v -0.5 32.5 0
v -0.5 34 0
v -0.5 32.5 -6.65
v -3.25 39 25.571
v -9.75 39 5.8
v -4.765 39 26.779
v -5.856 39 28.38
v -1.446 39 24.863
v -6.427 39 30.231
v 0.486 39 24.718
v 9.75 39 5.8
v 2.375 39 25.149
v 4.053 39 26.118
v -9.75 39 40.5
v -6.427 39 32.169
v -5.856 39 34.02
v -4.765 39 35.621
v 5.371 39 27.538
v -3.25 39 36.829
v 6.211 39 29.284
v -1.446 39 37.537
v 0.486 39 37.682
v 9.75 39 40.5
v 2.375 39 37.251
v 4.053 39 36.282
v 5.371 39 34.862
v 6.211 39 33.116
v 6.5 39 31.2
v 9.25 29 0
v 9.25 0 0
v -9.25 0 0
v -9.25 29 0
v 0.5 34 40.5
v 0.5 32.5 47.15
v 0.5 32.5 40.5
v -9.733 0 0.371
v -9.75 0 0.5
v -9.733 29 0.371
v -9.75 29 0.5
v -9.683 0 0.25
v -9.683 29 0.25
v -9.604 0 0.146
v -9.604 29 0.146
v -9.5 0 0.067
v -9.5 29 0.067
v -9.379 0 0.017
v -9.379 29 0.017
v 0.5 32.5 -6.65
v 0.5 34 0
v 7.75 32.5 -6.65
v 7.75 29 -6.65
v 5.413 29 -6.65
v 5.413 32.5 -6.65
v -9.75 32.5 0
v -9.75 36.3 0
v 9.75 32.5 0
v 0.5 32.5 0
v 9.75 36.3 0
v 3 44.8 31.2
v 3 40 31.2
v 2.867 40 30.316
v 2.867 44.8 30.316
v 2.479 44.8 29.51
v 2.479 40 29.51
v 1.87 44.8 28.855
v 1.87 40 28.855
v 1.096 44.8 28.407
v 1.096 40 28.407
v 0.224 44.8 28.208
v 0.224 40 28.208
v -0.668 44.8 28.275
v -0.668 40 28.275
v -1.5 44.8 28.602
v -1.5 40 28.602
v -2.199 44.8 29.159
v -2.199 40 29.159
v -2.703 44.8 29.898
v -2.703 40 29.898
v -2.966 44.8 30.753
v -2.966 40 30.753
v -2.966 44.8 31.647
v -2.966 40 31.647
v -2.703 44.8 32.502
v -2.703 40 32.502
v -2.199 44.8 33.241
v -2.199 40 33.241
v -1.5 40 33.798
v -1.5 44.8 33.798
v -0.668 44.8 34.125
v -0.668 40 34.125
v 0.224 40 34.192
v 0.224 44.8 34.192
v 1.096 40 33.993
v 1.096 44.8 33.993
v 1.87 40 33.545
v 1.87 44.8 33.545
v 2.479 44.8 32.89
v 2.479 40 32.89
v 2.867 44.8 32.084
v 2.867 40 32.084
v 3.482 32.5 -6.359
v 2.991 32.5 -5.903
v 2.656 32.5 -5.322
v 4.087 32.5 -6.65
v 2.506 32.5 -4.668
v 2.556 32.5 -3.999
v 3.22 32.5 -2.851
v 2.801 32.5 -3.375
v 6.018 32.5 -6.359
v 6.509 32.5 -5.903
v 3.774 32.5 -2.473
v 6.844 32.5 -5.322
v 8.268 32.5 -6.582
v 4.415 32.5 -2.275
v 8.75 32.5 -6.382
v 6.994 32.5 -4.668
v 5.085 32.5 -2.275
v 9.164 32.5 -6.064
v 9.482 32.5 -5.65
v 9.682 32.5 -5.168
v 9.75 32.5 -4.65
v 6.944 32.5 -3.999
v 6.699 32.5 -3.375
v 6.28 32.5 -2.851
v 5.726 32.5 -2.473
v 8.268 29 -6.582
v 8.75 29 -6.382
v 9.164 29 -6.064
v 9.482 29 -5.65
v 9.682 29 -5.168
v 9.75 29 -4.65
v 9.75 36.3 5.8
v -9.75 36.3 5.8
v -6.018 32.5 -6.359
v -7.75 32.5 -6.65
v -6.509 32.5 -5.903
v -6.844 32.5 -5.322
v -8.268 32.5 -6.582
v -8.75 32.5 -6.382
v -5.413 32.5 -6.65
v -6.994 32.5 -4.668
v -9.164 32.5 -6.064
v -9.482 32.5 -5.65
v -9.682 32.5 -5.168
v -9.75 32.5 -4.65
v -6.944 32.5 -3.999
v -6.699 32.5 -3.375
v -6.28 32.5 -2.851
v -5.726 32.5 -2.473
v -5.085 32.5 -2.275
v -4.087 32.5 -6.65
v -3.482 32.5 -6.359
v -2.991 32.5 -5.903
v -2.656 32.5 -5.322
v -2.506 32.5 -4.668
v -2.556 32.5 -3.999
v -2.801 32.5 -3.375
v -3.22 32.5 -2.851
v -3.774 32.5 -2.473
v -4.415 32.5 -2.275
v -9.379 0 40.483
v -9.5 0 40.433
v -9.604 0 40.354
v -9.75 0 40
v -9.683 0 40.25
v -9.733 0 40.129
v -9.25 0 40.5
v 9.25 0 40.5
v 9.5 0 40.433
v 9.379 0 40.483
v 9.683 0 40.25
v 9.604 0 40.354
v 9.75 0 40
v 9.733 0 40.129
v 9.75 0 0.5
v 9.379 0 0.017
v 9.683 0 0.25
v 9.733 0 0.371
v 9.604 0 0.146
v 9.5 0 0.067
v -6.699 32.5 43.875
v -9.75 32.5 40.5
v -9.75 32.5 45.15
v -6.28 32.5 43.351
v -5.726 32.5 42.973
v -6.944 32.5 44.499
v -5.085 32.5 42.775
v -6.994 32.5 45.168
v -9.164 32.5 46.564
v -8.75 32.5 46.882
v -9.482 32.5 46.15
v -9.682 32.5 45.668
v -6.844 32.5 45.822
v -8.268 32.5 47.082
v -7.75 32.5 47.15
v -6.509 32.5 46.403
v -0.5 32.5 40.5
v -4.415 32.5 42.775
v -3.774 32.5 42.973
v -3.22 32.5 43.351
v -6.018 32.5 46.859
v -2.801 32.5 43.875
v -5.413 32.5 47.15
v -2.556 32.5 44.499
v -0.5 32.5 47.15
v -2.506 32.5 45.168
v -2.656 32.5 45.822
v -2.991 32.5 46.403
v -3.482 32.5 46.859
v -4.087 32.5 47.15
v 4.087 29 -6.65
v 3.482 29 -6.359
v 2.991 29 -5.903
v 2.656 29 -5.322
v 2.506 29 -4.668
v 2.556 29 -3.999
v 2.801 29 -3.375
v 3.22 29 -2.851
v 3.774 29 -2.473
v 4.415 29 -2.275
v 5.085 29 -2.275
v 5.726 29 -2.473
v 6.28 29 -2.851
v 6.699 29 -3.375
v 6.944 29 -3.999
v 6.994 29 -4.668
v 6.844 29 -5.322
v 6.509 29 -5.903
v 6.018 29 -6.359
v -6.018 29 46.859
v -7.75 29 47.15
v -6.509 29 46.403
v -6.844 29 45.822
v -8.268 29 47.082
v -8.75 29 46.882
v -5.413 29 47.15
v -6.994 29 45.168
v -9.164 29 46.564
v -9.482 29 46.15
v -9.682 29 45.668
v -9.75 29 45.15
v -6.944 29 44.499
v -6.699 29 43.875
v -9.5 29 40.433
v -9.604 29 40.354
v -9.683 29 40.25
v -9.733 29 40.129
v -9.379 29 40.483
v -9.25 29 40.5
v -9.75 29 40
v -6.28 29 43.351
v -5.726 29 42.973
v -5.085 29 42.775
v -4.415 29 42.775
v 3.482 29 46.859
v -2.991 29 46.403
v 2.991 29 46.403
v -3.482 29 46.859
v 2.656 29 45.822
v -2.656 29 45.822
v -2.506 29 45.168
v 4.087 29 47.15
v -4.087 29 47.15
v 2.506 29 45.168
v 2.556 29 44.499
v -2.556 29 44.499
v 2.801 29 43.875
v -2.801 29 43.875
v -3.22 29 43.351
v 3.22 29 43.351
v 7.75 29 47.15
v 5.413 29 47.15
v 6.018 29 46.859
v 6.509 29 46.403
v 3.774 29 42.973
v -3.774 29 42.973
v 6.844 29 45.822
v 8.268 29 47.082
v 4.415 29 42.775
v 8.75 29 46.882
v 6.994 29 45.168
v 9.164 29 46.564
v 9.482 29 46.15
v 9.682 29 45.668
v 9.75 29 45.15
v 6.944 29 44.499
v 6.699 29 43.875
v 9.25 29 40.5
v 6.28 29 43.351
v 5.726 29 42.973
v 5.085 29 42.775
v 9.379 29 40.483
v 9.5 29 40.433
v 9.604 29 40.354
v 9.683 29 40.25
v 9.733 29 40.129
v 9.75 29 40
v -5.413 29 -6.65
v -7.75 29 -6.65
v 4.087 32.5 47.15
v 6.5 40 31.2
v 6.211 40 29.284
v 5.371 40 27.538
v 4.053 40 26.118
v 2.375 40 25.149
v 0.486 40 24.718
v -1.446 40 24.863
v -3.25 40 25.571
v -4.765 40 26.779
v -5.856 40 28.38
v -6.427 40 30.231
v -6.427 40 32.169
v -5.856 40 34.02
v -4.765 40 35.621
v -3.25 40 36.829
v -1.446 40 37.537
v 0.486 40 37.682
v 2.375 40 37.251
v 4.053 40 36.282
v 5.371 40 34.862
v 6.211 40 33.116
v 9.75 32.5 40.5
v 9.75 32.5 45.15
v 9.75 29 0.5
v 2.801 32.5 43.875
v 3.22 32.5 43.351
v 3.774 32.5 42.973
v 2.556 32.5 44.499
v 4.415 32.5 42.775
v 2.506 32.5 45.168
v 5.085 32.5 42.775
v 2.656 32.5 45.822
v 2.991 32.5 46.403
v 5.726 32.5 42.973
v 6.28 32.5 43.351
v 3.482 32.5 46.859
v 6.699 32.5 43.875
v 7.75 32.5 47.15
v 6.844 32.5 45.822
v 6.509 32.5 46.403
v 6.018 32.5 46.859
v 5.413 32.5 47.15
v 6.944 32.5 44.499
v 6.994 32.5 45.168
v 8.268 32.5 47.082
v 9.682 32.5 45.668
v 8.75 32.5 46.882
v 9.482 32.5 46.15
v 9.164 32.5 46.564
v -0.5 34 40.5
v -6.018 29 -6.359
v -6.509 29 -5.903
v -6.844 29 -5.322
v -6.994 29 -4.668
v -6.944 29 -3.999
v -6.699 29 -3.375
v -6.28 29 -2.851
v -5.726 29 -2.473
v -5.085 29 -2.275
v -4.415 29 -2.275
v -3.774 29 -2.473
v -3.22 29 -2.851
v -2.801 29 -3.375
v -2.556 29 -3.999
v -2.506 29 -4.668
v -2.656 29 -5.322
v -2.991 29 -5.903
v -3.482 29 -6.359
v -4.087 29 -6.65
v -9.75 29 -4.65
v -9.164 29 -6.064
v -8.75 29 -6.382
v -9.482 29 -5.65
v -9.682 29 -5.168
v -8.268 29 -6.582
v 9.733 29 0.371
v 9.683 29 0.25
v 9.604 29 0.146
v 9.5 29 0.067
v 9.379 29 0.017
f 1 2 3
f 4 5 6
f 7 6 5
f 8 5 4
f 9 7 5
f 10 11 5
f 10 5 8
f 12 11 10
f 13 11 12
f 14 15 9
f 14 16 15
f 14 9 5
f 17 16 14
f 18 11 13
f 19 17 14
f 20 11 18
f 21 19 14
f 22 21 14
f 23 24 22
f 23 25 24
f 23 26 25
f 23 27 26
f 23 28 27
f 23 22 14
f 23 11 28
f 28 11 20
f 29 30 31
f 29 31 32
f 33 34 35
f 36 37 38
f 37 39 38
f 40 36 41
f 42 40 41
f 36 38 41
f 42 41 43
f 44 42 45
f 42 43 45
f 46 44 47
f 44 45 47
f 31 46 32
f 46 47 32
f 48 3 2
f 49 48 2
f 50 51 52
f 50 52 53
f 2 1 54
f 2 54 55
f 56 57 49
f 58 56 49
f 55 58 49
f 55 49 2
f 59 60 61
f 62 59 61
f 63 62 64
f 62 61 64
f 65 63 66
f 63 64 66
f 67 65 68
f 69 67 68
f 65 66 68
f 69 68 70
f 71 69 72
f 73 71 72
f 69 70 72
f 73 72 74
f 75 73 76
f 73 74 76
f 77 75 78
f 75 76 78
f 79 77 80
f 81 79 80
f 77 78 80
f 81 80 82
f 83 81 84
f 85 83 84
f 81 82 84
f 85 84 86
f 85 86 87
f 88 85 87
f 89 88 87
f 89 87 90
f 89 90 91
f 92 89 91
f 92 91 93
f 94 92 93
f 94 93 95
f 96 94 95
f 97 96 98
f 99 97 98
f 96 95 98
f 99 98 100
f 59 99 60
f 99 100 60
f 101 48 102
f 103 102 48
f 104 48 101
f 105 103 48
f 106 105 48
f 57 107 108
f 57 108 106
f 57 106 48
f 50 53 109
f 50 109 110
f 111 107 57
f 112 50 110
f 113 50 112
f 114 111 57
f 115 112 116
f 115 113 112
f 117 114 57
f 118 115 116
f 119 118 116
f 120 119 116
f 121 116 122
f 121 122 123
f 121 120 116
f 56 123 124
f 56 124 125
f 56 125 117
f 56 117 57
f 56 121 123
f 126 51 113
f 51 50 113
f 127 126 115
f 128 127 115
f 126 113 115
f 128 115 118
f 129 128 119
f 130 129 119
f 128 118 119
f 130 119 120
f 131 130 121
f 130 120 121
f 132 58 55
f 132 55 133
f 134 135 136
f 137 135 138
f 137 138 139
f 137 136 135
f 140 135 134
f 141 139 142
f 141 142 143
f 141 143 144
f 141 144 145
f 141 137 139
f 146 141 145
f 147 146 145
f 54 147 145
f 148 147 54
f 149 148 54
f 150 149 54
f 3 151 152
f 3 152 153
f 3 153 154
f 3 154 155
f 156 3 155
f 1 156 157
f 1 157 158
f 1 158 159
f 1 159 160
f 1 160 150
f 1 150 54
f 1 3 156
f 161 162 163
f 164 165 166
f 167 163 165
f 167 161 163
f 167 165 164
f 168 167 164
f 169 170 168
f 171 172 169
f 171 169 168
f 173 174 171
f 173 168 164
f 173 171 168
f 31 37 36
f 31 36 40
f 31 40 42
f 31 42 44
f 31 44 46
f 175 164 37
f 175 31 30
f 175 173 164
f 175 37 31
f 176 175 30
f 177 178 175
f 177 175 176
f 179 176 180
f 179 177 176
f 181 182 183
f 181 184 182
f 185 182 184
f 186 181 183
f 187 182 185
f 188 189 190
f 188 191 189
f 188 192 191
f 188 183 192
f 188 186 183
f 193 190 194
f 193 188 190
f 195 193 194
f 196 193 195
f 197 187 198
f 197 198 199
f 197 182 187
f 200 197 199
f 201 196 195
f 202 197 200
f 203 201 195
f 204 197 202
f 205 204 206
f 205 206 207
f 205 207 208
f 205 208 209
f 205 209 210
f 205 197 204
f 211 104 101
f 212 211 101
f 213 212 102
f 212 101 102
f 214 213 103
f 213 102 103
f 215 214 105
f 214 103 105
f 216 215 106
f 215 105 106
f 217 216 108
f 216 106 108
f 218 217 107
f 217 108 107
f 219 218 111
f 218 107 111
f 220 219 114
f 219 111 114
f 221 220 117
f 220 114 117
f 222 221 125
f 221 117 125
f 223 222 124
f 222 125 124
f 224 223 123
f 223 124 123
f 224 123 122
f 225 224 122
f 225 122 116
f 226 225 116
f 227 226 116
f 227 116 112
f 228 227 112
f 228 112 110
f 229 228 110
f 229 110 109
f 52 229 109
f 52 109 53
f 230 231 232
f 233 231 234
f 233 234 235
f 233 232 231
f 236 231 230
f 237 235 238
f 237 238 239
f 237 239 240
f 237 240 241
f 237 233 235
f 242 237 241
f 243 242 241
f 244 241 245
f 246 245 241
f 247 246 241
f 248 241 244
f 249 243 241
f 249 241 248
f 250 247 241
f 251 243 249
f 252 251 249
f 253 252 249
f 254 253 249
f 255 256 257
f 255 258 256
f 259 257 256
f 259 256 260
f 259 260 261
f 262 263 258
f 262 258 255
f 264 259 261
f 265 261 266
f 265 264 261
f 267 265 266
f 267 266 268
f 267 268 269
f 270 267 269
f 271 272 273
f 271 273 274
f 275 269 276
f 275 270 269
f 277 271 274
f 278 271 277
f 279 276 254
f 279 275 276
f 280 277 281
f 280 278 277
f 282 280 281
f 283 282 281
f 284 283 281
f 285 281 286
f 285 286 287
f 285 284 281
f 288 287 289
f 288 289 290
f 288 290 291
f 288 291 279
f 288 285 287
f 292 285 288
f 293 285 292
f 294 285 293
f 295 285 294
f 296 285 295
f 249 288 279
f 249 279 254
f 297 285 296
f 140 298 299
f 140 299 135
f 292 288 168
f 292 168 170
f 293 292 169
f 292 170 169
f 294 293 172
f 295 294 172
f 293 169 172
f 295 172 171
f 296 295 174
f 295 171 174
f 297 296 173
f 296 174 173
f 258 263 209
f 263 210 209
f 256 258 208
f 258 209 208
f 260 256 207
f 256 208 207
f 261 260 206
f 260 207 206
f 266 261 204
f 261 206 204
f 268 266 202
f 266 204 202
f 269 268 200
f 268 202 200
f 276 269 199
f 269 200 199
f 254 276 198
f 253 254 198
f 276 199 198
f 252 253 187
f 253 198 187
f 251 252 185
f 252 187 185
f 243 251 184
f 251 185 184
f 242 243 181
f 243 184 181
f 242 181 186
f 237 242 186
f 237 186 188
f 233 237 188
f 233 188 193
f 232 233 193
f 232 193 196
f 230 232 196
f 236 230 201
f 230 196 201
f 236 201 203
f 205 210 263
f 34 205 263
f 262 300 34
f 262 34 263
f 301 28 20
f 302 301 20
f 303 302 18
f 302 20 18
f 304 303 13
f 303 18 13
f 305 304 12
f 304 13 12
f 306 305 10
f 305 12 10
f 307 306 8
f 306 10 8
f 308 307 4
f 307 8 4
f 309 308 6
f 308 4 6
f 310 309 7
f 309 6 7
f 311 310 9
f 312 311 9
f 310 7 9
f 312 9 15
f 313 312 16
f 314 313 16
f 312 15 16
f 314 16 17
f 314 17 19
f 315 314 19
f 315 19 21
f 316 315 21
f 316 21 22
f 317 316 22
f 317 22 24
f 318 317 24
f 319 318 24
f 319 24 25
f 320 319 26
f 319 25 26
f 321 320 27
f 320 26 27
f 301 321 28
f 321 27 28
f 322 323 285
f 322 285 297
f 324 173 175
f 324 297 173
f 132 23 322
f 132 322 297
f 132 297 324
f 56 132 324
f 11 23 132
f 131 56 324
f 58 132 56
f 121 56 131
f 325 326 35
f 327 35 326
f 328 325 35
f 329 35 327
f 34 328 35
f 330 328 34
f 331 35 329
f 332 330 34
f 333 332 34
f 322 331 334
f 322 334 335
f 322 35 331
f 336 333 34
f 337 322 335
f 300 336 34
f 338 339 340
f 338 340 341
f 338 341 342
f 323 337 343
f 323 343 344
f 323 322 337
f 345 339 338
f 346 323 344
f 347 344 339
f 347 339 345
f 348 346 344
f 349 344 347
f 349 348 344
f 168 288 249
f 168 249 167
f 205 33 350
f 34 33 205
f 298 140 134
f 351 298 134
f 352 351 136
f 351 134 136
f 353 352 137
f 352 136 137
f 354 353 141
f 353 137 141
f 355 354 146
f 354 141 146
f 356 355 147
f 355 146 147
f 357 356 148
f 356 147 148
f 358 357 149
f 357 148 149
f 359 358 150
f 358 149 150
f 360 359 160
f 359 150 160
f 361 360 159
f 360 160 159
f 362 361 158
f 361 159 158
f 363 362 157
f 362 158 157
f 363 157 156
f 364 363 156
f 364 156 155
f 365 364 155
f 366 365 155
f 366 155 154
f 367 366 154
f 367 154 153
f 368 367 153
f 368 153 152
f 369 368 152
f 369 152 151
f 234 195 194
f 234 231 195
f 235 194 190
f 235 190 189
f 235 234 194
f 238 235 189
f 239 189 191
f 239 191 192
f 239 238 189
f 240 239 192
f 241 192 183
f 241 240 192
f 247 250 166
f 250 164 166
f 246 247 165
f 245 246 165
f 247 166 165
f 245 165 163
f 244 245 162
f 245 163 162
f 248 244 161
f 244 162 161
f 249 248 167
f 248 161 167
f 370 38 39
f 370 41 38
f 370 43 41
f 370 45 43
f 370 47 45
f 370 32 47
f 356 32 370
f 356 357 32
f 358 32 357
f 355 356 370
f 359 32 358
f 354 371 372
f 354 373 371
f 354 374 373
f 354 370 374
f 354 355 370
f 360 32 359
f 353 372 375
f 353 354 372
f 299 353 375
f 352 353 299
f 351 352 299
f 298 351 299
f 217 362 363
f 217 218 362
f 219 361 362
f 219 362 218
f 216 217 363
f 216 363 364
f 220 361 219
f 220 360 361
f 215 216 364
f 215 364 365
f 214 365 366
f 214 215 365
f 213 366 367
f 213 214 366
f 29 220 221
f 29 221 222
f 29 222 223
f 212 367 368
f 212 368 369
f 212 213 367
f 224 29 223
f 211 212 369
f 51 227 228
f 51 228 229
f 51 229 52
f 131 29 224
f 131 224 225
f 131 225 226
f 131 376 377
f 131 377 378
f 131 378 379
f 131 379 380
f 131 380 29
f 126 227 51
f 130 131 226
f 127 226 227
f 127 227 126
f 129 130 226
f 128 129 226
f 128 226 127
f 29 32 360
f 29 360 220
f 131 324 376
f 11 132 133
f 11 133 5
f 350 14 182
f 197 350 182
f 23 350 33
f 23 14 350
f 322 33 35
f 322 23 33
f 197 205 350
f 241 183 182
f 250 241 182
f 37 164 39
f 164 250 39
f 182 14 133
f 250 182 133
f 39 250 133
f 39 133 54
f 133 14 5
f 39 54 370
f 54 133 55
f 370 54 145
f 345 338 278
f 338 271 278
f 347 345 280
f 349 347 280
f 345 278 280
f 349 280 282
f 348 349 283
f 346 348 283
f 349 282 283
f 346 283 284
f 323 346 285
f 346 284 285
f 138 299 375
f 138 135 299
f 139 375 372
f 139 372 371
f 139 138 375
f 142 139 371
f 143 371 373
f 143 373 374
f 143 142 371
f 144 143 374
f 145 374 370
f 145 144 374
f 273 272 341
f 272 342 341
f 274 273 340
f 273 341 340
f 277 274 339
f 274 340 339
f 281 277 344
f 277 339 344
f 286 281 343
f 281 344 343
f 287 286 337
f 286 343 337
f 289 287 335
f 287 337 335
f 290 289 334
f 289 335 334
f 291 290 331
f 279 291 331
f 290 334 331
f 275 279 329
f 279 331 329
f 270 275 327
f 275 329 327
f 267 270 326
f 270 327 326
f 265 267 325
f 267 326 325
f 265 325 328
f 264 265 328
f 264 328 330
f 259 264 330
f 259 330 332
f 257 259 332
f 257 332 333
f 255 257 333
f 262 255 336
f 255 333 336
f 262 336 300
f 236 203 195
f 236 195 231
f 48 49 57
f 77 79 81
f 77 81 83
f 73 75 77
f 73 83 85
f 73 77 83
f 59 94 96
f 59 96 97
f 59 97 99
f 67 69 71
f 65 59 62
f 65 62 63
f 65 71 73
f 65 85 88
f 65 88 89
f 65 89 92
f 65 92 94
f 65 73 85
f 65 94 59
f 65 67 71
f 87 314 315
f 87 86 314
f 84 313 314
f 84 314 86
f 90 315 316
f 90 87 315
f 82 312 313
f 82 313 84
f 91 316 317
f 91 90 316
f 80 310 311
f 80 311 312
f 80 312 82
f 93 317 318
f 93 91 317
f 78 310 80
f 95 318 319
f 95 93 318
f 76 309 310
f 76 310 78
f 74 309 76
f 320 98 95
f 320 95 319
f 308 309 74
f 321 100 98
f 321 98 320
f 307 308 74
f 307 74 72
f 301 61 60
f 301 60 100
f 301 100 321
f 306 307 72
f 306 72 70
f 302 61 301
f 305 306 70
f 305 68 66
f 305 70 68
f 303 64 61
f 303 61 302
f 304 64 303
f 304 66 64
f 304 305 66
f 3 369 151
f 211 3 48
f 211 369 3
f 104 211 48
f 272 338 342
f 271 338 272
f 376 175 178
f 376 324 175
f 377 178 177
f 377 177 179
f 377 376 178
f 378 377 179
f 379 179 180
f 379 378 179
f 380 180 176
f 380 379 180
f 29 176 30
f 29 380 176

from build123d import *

# Parameters (mm, degrees)
MAIN_DEPTH          = 9.75
SKETCH4_R           = 6.5
BASECIRCLE_DEPTH    = 1
SKETCH5_R           = 3
GEAR_DEPTH          = 4.8
SKETCH9_R           = 2.25
FIXING_HOLE_DEPTH   = 19.05
FIXINGFILLET_R      = 2
REINFORCEMENT_DEPTH = 0.5
SERVOFILLET_R       = 0.5


with BuildPart() as part:
    # Sketch1 → Main (new body, symmetric)
    with BuildSketch(Plane(origin=(0, 0, 0), x_dir=(0, 0, -1), z_dir=(1, 0, 0))):
        Polygon((-40.5, 0), (0, 0), (0, 29), (6.65, 29), (6.65, 32.5), (0, 32.5), (0, 36.3), (-5.8, 36.3), (-5.8, 39), (-40.5, 39), (-40.5, 32.5), (-47.15, 32.5), (-47.15, 29), (-40.5, 29), align=None)
    extrude(amount=MAIN_DEPTH, both=True)

    # Sketch4 → BaseCircle (add)
    with BuildSketch(Plane(origin=(0, 39, 0), x_dir=(1, 0, 0), z_dir=(0, 1, 0))):
        with Locations((0, -31.2)):
            Circle(SKETCH4_R)
    extrude(amount=BASECIRCLE_DEPTH)

    # Sketch5 → Gear (add)
    with BuildSketch(Plane(origin=(0, 40, 0), x_dir=(1, 0, 0), z_dir=(0, 1, 0))):
        with Locations((0, -31.2)):
            Circle(SKETCH5_R)
    extrude(amount=GEAR_DEPTH)

    # Sketch9 → Fixing-Hole (cut)
    with BuildSketch(Plane(origin=(0, 32.5, 0), x_dir=(-1, 0, 0), z_dir=(0, 1, 0))):
        with Locations((-4.75, 45)):
            Circle(SKETCH9_R)
        with Locations((4.75, 45)):
            Circle(SKETCH9_R)
        with Locations((4.75, -4.5)):
            Circle(SKETCH9_R)
        with Locations((-4.75, -4.5)):
            Circle(SKETCH9_R)
    extrude(amount=-FIXING_HOLE_DEPTH, mode=Mode.SUBTRACT)

    # FixingFillet
    fixingfillet_edges = [part.edges().sort_by_distance(p)[0] for p in [
        (-9.75, 30.75, 47.15),
        (9.75, 30.75, -6.65),
        (-9.75, 30.75, -6.65),
        (9.75, 30.75, 47.15),
    ]]
    fillet(fixingfillet_edges, radius=FIXINGFILLET_R)

    # Esquisse1 → Reinforcement (add, symmetric)
    with BuildSketch(Plane(origin=(0, 0, 0), x_dir=(0, 0, -1), z_dir=(1, 0, 0))):
        Polygon((6.65, 32.5), (0, 34), (0, 32.5), align=None)
        Polygon((-47.15, 32.5), (-40.5, 32.5), (-40.5, 34), align=None)
    extrude(amount=REINFORCEMENT_DEPTH, both=True)

    # ServoFillet
    servofillet_edges = [part.edges().sort_by_distance(p)[0] for p in [
        (9.75, 14.5, 0),
        (-9.75, 14.5, 0),
        (-9.75, 14.5, 40.5),
        (9.75, 14.5, 40.5),
    ]]
    fillet(servofillet_edges, radius=SERVOFILLET_R)


solid = part.part
